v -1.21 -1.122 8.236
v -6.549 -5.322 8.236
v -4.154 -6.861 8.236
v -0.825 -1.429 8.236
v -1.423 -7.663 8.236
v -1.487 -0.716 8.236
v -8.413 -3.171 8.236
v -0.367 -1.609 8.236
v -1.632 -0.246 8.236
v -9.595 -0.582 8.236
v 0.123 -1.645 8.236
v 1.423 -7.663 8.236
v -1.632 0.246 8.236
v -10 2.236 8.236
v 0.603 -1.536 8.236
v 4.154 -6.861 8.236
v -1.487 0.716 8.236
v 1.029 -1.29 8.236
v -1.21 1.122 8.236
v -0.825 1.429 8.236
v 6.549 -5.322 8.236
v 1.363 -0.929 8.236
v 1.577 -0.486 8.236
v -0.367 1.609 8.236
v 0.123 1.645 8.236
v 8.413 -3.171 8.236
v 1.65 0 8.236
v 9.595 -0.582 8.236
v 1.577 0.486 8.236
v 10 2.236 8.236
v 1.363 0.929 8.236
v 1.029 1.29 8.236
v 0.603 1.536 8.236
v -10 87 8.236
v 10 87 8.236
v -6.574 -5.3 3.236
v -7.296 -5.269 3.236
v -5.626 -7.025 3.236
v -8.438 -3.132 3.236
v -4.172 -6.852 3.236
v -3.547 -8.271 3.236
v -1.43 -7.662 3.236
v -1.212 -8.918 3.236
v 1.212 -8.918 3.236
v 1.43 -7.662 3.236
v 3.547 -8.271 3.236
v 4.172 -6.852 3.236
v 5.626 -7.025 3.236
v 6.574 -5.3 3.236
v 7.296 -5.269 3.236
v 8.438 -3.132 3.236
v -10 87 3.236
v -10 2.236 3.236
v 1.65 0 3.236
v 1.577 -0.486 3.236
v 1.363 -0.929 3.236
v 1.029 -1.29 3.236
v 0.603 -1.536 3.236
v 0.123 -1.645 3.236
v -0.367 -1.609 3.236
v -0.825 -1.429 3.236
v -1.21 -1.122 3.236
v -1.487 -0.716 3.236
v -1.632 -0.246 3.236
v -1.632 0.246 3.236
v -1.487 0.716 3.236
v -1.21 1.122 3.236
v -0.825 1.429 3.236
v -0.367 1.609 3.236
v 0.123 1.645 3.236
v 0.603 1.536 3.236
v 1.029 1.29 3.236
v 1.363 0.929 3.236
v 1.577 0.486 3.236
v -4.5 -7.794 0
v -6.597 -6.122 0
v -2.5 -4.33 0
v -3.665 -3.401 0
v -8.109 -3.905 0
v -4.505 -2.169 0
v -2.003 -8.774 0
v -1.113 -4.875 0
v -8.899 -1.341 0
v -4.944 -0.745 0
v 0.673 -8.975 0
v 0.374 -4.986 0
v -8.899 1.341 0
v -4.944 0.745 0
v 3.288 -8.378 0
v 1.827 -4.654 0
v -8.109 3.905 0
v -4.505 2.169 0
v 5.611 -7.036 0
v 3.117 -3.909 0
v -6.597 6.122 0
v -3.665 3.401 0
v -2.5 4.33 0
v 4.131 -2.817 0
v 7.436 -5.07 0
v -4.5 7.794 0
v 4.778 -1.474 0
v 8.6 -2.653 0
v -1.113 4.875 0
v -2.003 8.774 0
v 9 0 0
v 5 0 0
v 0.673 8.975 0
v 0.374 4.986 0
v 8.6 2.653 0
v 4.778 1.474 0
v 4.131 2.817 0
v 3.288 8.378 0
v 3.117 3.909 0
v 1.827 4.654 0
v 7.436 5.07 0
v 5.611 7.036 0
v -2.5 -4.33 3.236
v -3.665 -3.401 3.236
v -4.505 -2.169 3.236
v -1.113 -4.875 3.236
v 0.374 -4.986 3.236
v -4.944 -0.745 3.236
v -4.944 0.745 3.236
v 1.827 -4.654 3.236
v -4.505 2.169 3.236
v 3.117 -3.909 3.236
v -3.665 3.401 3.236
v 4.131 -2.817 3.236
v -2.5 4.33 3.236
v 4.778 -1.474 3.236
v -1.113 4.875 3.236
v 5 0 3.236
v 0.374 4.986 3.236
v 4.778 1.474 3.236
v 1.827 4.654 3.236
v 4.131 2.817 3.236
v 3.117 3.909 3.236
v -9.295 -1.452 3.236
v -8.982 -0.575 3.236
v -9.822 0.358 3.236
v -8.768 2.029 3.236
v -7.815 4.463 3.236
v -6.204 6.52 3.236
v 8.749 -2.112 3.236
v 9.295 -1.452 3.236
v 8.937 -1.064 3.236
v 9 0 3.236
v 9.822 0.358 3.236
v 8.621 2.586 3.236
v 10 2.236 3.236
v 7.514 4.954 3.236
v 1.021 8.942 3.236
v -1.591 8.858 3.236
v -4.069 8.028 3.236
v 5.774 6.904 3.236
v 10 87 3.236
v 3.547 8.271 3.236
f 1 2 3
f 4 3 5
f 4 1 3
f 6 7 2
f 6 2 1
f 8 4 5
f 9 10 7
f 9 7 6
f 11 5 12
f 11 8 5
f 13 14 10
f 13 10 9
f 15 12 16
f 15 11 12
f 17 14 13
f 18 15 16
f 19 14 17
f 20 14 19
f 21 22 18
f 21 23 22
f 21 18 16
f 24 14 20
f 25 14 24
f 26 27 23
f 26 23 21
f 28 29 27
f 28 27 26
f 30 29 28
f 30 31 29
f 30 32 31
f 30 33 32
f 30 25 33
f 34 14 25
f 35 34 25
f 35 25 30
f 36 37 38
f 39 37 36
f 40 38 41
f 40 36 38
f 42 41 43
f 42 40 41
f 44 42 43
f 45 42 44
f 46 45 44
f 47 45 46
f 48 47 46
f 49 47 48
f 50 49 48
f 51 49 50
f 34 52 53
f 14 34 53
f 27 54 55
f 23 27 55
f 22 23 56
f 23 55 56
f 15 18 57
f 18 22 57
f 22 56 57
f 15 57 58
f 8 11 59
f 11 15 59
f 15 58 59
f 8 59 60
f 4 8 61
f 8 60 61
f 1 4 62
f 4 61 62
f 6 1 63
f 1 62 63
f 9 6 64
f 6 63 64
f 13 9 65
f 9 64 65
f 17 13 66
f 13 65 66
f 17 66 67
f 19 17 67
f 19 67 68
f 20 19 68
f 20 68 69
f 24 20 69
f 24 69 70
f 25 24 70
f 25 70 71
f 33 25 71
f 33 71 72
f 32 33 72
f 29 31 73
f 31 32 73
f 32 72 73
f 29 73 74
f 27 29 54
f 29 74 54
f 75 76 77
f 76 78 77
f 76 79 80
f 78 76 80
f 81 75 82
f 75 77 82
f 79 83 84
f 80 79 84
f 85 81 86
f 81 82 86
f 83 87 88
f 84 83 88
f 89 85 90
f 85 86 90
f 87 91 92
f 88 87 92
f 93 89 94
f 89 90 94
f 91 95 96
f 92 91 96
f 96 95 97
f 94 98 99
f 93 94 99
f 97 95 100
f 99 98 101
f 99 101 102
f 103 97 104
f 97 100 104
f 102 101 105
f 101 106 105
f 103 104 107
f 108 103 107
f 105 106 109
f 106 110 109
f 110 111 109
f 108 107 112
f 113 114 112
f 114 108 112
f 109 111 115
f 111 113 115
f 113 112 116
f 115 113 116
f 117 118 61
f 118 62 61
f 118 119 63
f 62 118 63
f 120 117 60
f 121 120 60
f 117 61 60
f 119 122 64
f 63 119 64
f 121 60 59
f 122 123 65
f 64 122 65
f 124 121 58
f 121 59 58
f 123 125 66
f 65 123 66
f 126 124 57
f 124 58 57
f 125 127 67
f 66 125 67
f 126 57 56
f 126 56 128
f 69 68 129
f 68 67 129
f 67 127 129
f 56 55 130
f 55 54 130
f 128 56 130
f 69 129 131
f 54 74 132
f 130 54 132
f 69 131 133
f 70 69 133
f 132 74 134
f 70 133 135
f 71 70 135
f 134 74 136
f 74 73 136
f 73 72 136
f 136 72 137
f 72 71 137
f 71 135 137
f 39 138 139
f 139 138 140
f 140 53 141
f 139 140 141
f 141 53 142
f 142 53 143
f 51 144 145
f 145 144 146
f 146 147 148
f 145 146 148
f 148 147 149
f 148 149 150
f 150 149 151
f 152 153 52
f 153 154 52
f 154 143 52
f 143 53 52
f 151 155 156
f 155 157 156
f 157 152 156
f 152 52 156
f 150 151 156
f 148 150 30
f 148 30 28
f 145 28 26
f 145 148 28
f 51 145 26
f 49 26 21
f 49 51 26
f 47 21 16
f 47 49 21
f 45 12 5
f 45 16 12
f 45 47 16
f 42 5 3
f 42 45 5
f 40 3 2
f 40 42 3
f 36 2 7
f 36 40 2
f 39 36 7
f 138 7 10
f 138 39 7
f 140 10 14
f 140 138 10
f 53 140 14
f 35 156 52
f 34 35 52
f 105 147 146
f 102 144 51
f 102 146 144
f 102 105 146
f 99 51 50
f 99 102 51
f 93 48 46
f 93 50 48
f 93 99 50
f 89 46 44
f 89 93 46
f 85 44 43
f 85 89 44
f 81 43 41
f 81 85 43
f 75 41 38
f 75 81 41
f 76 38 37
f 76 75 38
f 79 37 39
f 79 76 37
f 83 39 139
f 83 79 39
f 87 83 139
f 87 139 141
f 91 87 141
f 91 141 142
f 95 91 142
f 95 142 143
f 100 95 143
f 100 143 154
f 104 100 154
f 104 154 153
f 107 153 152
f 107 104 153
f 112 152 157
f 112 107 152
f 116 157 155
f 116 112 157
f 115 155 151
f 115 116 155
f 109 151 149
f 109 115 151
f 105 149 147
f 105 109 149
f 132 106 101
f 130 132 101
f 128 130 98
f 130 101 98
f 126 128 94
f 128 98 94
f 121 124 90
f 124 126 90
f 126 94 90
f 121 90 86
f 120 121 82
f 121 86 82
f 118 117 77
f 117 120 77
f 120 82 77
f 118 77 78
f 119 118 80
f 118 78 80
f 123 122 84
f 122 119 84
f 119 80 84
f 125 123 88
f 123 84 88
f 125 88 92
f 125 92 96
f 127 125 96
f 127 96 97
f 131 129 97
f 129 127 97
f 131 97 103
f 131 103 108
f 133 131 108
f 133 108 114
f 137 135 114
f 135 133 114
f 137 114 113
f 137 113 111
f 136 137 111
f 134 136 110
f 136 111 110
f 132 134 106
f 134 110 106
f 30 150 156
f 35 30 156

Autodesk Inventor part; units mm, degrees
ref_plane "YZ Plane" through (0, 0, 0) normal (1, 0, 0) x (0, 1, 0)
ref_plane "XZ Plane" through (0, 0, 0) normal (0, 1, 0) x (-1, 0, 0)
ref_plane "XY Plane" through (0, 0, 0) normal (0, 0, 1) x (1, 0, 0)
sketch "Эскиз1" plane through (0, 0, 0) normal (0, 0, 1) x (1, 0, 0)
  circle A0 centre (0, 0) radius 9 projected
  circle A1 centre (0, 0) radius 5 projected
  circle A2 centre (0, 0) radius 1.65 projected
  point P0 (0, 0)
extrude "Выдавливание1" add sketch "Эскиз1" along normal blind 3.2363 contours A0
sketch "Эскиз2" plane through (0, 0, 3.2363) normal (0, 0, 1) x (1, 0, 0)
  line L0 (0, -7.7644) -> (0, 107) construction
  line L1 (10, 2.2356) -> (10, 97)
  line L2 (-10, 97) -> (-10, 2.2356)
  arc A0 (-10, 2.2356) -> (10, 2.2356) centre (0, 2.2356) ccw
  arc A1 (10, 97) -> (-10, 97) centre (0, 97) ccw
  line L3 (343.1024, 87) -> (-136.8976, 87) projected
  circle A2 centre (0, 0) radius 5 construction
  circle A3 centre (0, 0) radius 1.65
  point P0 (0, 0)
  point P1 (0, 49.6178)
  point P2 (0, 107)
  point P3 (10, 87)
  point P4 (-10, 87)
  dimension "d2" = 20
  dimension "d3" = 20
  dimension "d4" = 3.3
extrude "Выдавливание2" add sketch "Эскиз2" along normal blind 5 contours A0 L2 L3 L1
properties part number "шатун2"
